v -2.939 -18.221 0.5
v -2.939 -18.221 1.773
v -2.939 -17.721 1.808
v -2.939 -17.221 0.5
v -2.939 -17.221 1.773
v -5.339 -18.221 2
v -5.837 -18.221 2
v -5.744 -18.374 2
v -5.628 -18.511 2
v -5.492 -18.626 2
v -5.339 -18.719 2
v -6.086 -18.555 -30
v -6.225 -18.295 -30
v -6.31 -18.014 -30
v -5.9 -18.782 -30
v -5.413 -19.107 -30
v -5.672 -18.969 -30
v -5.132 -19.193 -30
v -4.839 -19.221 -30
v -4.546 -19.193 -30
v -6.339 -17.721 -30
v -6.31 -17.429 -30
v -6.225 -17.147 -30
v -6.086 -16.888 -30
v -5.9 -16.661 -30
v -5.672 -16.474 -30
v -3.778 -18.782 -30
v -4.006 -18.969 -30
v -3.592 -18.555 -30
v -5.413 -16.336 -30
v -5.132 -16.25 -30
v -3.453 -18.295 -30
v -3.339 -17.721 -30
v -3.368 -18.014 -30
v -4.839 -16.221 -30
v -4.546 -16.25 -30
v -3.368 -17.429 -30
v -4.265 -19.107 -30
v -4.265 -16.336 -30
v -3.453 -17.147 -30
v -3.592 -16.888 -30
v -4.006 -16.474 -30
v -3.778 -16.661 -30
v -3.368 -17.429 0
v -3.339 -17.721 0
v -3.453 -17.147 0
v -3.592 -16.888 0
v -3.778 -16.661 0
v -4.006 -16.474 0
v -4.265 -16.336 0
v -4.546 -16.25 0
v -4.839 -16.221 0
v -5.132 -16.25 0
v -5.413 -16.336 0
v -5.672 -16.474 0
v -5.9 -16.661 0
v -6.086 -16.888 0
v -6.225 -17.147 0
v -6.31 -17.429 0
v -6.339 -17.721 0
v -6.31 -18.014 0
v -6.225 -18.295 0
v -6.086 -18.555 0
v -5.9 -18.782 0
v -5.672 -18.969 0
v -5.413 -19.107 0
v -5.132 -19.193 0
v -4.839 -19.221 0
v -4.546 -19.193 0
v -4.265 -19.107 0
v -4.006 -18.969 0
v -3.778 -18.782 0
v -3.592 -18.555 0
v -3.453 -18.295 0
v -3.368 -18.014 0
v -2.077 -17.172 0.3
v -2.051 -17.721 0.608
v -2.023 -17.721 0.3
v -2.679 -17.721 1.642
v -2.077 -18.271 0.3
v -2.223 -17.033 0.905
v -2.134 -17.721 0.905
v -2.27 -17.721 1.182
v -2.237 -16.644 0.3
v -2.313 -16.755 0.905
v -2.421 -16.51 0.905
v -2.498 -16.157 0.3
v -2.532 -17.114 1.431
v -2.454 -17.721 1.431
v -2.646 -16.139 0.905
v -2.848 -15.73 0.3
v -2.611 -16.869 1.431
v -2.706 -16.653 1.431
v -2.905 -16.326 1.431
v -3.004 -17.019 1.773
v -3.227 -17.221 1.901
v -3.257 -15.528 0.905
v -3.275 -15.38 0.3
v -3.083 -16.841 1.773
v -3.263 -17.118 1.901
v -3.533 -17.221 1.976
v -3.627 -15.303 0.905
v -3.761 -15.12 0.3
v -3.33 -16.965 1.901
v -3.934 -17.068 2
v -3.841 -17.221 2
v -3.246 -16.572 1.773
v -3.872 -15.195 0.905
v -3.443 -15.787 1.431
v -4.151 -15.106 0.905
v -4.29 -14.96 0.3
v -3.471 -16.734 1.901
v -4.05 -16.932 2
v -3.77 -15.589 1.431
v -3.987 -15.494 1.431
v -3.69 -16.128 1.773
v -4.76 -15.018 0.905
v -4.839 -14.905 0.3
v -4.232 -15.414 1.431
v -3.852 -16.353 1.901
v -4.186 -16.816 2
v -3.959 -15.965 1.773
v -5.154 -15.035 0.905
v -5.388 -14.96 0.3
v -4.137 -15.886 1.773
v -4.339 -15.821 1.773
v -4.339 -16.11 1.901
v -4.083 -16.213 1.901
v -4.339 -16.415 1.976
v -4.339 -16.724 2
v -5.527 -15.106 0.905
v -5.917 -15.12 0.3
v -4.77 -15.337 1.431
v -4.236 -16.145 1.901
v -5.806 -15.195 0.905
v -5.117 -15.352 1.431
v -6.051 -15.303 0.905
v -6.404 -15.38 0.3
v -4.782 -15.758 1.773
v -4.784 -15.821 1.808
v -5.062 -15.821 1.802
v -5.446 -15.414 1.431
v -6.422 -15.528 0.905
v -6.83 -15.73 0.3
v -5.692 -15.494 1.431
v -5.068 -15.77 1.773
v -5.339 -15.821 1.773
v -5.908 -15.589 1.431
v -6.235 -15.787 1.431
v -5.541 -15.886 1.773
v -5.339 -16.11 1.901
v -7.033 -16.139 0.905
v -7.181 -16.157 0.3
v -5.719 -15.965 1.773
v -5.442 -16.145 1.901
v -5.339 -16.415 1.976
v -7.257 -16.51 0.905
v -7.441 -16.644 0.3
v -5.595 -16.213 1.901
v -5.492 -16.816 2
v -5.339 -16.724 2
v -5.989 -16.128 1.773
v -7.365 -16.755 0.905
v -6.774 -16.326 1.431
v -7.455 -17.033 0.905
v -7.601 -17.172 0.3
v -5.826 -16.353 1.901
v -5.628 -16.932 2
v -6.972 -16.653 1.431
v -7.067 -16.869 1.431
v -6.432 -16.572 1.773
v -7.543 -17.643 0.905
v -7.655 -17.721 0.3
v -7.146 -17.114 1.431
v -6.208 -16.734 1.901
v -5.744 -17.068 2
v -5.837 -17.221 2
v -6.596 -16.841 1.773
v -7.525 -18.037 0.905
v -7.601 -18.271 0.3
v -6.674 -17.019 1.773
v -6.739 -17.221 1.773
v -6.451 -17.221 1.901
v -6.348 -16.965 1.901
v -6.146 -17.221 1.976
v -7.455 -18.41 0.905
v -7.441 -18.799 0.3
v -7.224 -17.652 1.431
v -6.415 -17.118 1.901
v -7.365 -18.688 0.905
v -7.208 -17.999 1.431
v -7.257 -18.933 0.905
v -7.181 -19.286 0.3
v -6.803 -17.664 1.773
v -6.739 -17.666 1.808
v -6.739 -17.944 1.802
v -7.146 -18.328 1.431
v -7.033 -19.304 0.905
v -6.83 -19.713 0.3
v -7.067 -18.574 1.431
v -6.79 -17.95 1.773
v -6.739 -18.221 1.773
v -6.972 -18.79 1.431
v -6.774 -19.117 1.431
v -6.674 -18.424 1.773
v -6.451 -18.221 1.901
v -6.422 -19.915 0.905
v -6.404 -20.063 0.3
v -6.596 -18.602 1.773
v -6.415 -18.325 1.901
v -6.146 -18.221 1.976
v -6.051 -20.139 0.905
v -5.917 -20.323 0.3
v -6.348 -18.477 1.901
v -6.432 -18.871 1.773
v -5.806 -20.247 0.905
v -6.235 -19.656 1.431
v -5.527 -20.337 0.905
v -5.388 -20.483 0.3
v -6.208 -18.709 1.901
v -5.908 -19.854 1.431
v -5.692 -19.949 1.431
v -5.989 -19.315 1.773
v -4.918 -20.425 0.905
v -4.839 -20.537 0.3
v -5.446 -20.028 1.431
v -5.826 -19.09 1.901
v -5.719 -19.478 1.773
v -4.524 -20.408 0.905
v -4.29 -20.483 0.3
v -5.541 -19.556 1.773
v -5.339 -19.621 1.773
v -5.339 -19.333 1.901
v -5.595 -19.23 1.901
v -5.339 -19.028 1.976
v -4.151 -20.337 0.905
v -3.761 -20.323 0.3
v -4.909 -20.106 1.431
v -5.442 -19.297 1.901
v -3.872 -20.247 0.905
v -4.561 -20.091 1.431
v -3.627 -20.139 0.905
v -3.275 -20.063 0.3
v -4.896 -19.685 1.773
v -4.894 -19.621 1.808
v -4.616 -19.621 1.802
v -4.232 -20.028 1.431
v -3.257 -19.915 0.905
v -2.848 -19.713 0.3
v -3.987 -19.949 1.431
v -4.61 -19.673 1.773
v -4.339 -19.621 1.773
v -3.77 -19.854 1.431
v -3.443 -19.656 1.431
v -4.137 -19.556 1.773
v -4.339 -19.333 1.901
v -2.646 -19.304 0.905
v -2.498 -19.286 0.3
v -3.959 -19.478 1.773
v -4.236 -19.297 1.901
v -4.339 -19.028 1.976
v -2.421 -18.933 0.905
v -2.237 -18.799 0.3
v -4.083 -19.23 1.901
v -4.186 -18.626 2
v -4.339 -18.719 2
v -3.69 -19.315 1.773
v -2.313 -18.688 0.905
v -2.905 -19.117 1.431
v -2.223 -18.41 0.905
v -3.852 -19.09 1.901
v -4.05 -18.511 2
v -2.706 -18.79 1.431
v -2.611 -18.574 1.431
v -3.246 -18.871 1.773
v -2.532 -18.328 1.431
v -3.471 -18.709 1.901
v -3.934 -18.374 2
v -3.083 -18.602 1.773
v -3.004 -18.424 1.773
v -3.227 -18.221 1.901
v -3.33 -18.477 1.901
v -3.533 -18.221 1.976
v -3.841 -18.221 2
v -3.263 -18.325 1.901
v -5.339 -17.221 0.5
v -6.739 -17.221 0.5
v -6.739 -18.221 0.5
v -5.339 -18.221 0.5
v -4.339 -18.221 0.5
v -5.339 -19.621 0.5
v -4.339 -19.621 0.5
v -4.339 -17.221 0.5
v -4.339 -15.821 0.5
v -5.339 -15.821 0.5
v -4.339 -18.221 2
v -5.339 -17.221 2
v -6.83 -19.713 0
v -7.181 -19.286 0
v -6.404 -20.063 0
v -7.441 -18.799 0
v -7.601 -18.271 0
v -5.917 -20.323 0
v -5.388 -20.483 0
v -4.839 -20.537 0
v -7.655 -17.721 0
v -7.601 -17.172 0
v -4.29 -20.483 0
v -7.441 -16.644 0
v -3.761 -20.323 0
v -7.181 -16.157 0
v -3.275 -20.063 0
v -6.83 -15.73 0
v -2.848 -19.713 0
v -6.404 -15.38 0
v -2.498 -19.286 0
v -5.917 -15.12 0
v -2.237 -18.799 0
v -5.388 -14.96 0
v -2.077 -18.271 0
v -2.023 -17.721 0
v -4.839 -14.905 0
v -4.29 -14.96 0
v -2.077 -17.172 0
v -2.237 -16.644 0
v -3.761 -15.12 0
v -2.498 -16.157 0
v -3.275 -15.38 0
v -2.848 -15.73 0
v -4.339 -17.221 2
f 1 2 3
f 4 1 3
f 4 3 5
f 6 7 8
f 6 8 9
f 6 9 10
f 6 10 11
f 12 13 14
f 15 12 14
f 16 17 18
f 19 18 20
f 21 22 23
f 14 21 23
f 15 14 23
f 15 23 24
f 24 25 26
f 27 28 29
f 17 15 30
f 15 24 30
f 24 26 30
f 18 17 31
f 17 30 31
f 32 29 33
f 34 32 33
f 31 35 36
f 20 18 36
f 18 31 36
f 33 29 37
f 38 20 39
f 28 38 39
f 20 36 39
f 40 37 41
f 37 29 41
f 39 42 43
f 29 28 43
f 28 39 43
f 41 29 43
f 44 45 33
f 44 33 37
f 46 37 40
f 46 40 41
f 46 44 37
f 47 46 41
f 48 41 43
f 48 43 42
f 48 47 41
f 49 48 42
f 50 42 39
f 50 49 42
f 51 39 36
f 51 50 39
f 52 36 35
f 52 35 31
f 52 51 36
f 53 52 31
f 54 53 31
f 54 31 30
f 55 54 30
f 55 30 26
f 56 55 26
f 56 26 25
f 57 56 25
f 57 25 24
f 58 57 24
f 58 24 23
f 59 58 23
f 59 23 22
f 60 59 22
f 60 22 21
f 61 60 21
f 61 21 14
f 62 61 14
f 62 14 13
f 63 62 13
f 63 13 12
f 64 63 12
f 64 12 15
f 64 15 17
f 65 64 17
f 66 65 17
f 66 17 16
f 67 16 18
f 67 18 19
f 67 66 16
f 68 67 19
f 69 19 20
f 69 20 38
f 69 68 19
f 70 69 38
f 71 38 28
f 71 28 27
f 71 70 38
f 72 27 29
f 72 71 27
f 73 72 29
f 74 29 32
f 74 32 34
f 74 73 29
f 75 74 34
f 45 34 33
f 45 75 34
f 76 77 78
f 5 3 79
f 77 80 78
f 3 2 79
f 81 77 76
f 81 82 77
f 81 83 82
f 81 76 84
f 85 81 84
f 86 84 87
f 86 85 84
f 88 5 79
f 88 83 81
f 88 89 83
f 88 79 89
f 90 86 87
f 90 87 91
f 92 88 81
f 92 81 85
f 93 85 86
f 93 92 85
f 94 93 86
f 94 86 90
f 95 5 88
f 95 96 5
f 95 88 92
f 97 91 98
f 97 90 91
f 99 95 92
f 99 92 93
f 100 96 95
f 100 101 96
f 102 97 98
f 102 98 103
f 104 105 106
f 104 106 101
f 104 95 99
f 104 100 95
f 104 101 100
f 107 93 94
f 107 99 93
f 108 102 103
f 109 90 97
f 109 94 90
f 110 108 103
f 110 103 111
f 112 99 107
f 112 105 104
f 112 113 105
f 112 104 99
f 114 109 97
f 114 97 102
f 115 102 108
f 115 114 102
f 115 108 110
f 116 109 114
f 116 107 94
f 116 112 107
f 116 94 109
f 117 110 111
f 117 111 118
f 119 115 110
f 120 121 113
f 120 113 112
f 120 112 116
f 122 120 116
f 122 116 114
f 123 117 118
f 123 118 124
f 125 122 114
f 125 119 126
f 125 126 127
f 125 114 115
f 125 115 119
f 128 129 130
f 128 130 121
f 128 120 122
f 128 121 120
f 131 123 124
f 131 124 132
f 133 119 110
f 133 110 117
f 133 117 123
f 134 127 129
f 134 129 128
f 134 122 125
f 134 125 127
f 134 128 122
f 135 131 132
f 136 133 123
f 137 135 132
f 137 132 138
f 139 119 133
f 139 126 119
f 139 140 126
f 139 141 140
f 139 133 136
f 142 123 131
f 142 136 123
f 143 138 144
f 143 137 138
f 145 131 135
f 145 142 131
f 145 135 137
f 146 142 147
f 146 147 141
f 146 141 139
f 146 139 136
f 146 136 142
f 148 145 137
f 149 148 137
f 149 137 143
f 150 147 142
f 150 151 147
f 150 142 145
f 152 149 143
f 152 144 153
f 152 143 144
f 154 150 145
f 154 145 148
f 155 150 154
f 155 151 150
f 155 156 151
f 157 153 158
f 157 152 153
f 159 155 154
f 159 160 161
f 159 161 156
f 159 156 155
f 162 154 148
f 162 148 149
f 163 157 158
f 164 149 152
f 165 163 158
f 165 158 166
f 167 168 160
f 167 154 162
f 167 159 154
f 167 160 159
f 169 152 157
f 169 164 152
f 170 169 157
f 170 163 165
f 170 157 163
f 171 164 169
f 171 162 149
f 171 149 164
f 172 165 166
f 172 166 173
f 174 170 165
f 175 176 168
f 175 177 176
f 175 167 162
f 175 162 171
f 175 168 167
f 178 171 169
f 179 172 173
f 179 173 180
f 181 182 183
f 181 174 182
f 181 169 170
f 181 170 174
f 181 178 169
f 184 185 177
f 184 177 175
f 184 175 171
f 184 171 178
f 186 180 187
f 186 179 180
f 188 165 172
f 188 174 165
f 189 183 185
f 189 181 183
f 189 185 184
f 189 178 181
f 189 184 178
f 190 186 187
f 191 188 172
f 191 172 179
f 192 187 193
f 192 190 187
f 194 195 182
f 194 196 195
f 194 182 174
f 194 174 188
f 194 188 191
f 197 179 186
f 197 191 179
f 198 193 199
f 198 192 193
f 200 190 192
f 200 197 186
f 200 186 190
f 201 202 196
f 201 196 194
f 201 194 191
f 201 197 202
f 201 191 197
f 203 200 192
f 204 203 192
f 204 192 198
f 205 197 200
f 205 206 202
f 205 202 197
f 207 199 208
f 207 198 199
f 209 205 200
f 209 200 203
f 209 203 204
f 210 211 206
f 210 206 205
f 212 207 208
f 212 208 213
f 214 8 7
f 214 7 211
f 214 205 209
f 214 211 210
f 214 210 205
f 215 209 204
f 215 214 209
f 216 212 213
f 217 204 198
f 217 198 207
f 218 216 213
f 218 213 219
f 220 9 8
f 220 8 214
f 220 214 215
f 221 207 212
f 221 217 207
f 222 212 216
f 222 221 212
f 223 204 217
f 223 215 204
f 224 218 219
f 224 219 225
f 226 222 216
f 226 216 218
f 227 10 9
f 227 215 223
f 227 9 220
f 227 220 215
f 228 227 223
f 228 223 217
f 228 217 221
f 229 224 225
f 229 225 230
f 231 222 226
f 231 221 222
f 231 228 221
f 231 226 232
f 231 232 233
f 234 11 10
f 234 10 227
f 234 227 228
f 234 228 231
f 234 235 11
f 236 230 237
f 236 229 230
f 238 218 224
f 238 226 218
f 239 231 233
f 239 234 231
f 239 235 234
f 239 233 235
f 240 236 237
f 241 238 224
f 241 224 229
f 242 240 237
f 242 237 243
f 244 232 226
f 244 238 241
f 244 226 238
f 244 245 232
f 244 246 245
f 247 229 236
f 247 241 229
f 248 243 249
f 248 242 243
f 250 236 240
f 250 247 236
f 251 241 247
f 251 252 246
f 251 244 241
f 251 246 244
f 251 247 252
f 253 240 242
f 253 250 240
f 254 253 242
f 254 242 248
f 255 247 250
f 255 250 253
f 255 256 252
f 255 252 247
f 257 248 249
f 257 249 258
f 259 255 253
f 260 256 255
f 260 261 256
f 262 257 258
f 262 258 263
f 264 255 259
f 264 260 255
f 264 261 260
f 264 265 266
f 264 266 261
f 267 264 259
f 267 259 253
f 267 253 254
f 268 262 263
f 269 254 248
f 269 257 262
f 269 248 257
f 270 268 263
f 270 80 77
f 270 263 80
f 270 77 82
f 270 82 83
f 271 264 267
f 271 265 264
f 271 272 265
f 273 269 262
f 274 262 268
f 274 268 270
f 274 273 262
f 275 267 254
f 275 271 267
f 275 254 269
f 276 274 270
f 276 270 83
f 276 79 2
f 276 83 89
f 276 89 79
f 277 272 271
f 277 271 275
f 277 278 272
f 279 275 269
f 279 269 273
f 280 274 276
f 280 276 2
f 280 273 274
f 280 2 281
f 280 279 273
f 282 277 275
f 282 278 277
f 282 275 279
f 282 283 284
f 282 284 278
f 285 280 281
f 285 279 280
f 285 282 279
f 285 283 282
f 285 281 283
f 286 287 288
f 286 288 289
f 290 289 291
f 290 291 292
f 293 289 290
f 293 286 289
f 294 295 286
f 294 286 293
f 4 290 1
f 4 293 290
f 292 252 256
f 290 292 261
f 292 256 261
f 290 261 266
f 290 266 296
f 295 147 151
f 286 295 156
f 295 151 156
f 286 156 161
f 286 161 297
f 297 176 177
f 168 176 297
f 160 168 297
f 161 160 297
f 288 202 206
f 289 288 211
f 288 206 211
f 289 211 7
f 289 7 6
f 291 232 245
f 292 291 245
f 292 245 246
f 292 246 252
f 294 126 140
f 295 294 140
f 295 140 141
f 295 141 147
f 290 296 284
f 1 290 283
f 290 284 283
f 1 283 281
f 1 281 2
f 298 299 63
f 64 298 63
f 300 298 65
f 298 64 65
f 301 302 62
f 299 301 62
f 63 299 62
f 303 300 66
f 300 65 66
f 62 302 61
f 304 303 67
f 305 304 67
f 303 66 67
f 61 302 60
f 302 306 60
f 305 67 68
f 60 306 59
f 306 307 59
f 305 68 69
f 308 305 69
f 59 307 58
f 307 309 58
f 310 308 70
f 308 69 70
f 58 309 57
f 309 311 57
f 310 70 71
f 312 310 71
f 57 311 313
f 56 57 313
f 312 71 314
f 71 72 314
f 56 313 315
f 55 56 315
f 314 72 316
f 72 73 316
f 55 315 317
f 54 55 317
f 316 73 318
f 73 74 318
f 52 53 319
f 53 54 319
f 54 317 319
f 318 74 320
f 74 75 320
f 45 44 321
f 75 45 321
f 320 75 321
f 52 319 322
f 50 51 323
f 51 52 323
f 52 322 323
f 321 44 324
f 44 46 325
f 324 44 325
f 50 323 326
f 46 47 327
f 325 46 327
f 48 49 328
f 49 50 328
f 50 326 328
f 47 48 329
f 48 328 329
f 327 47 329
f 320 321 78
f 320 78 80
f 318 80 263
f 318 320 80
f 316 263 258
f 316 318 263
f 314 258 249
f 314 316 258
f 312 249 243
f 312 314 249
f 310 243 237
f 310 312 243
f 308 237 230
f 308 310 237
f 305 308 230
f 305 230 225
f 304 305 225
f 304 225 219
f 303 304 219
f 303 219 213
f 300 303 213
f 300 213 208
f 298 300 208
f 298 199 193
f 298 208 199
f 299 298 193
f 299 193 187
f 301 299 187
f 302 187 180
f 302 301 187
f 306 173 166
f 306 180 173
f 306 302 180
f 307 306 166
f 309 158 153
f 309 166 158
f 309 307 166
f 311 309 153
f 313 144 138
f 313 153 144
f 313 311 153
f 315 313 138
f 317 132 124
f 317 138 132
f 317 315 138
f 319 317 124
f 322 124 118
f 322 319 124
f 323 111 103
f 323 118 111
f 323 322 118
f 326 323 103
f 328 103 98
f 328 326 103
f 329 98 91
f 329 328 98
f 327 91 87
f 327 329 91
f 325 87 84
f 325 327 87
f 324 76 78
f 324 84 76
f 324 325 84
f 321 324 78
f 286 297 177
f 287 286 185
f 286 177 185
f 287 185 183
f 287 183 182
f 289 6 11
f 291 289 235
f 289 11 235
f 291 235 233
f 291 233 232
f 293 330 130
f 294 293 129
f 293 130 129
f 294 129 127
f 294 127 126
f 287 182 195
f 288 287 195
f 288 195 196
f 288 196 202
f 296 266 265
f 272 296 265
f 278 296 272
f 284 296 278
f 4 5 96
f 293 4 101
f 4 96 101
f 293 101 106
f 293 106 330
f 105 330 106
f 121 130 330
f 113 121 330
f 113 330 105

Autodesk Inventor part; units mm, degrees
ref_plane "YZ Plane" through (0, 0, 0) normal (1, 0, 0) x (0, 1, 0)
ref_plane "XZ Plane" through (0, 0, 0) normal (0, 1, 0) x (-1, 0, 0)
ref_plane "XY Plane" through (0, 0, 0) normal (0, 0, 1) x (1, 0, 0)
sketch "Эскиз1" plane through (0, 0, 0) normal (0, 0, 1) x (1, 0, 0)
  circle A0 centre (-4.8391, -17.7214) radius 1.5
  point P0 (0, 0)
extrude "Выдавливание1" add sketch "Эскиз1" against normal blind 30
sketch "Эскиз2" plane through (-4.8391, -17.7214, 0) normal (0, 0, 1) x (1, 0, 0)
  circle A0 centre (0, 0) radius 2.816
  point P0 (4.8391, 17.7214)
extrude "Выдавливание2" add sketch "Эскиз2" along normal blind 2
fillet "Сопряжение1" radius 1.7 1 edges at (-7.6551, -17.7214, 2)
sketch "Эскиз3" plane through (-4.8391, -17.7214, 2) normal (0, 0, 1) x (1, 0, 0)
  line L0 (-0.5, -1.9) -> (0.5, -1.9)
  line L1 (0.5, 1.9) -> (-0.5, 1.9)
  line L2 (1.9, -0.5) -> (1.9, 0.5)
  line L3 (-1.9, 0.5) -> (-1.9, -0.5)
  line L4 (-0.5, 1.9) -> (-0.5, 0.5)
  line L5 (-0.5, -0.5) -> (-0.5, -1.9)
  line L6 (1.9, 0.5) -> (0.5, 0.5)
  line L7 (-0.5, 0.5) -> (-1.9, 0.5)
  line L8 (0.5, -1.9) -> (0.5, -0.5)
  line L9 (0.5, 0.5) -> (0.5, 1.9)
  line L10 (-1.9, -0.5) -> (-0.5, -0.5)
  line L11 (0.5, -0.5) -> (1.9, -0.5)
  point P0 (4.8391, 17.7214)
  point P1 (0, 0)
extrude "Выдавливание3" cut sketch "Эскиз3" against normal blind 1.5
thread "Резьба1" size "M3x0.5" class "6g" standard "ISO Metric profile" full length
properties part number "Винт М3х30"
